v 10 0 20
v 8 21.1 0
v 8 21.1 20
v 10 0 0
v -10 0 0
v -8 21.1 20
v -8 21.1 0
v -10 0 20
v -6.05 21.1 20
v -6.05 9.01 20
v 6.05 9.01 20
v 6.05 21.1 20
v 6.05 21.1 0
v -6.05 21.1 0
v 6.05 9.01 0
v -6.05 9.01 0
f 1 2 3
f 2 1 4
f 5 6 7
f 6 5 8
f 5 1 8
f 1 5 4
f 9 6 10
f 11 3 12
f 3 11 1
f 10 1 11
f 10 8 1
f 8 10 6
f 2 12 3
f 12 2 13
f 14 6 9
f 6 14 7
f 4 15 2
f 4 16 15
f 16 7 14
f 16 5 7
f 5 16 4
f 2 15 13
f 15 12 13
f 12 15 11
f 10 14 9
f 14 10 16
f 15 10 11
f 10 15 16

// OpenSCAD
// Model purpose: Trapezoidal shelf shim for compensating uneven gaps and stabilizing shelf or furniture contact points in the office/home.
// Includes an internal clearance cutout so the shim seats around existing features while still providing load-bearing support.
INF = 1000;
EPS = 0.01;
BOTTOM_WIDTH = 20;
TOP_WIDTH = 16;
THICKNESS = 9;
DEPTH = 20;

HOLE_WIDTH = 12.1;
HOLE_HEIGHT = 12.1;
HEIGHT = HOLE_HEIGHT + THICKNESS;

difference() {
  linear_extrude(DEPTH) polygon([
    [-BOTTOM_WIDTH/2, 0],
    [BOTTOM_WIDTH/2, 0],
    [TOP_WIDTH/2, HEIGHT],
    [-TOP_WIDTH/2, HEIGHT],
  ]);

  translate([-HOLE_WIDTH/2, HEIGHT-HOLE_HEIGHT+EPS, -INF/2])
    cube([HOLE_WIDTH, HOLE_HEIGHT, INF]);
}
